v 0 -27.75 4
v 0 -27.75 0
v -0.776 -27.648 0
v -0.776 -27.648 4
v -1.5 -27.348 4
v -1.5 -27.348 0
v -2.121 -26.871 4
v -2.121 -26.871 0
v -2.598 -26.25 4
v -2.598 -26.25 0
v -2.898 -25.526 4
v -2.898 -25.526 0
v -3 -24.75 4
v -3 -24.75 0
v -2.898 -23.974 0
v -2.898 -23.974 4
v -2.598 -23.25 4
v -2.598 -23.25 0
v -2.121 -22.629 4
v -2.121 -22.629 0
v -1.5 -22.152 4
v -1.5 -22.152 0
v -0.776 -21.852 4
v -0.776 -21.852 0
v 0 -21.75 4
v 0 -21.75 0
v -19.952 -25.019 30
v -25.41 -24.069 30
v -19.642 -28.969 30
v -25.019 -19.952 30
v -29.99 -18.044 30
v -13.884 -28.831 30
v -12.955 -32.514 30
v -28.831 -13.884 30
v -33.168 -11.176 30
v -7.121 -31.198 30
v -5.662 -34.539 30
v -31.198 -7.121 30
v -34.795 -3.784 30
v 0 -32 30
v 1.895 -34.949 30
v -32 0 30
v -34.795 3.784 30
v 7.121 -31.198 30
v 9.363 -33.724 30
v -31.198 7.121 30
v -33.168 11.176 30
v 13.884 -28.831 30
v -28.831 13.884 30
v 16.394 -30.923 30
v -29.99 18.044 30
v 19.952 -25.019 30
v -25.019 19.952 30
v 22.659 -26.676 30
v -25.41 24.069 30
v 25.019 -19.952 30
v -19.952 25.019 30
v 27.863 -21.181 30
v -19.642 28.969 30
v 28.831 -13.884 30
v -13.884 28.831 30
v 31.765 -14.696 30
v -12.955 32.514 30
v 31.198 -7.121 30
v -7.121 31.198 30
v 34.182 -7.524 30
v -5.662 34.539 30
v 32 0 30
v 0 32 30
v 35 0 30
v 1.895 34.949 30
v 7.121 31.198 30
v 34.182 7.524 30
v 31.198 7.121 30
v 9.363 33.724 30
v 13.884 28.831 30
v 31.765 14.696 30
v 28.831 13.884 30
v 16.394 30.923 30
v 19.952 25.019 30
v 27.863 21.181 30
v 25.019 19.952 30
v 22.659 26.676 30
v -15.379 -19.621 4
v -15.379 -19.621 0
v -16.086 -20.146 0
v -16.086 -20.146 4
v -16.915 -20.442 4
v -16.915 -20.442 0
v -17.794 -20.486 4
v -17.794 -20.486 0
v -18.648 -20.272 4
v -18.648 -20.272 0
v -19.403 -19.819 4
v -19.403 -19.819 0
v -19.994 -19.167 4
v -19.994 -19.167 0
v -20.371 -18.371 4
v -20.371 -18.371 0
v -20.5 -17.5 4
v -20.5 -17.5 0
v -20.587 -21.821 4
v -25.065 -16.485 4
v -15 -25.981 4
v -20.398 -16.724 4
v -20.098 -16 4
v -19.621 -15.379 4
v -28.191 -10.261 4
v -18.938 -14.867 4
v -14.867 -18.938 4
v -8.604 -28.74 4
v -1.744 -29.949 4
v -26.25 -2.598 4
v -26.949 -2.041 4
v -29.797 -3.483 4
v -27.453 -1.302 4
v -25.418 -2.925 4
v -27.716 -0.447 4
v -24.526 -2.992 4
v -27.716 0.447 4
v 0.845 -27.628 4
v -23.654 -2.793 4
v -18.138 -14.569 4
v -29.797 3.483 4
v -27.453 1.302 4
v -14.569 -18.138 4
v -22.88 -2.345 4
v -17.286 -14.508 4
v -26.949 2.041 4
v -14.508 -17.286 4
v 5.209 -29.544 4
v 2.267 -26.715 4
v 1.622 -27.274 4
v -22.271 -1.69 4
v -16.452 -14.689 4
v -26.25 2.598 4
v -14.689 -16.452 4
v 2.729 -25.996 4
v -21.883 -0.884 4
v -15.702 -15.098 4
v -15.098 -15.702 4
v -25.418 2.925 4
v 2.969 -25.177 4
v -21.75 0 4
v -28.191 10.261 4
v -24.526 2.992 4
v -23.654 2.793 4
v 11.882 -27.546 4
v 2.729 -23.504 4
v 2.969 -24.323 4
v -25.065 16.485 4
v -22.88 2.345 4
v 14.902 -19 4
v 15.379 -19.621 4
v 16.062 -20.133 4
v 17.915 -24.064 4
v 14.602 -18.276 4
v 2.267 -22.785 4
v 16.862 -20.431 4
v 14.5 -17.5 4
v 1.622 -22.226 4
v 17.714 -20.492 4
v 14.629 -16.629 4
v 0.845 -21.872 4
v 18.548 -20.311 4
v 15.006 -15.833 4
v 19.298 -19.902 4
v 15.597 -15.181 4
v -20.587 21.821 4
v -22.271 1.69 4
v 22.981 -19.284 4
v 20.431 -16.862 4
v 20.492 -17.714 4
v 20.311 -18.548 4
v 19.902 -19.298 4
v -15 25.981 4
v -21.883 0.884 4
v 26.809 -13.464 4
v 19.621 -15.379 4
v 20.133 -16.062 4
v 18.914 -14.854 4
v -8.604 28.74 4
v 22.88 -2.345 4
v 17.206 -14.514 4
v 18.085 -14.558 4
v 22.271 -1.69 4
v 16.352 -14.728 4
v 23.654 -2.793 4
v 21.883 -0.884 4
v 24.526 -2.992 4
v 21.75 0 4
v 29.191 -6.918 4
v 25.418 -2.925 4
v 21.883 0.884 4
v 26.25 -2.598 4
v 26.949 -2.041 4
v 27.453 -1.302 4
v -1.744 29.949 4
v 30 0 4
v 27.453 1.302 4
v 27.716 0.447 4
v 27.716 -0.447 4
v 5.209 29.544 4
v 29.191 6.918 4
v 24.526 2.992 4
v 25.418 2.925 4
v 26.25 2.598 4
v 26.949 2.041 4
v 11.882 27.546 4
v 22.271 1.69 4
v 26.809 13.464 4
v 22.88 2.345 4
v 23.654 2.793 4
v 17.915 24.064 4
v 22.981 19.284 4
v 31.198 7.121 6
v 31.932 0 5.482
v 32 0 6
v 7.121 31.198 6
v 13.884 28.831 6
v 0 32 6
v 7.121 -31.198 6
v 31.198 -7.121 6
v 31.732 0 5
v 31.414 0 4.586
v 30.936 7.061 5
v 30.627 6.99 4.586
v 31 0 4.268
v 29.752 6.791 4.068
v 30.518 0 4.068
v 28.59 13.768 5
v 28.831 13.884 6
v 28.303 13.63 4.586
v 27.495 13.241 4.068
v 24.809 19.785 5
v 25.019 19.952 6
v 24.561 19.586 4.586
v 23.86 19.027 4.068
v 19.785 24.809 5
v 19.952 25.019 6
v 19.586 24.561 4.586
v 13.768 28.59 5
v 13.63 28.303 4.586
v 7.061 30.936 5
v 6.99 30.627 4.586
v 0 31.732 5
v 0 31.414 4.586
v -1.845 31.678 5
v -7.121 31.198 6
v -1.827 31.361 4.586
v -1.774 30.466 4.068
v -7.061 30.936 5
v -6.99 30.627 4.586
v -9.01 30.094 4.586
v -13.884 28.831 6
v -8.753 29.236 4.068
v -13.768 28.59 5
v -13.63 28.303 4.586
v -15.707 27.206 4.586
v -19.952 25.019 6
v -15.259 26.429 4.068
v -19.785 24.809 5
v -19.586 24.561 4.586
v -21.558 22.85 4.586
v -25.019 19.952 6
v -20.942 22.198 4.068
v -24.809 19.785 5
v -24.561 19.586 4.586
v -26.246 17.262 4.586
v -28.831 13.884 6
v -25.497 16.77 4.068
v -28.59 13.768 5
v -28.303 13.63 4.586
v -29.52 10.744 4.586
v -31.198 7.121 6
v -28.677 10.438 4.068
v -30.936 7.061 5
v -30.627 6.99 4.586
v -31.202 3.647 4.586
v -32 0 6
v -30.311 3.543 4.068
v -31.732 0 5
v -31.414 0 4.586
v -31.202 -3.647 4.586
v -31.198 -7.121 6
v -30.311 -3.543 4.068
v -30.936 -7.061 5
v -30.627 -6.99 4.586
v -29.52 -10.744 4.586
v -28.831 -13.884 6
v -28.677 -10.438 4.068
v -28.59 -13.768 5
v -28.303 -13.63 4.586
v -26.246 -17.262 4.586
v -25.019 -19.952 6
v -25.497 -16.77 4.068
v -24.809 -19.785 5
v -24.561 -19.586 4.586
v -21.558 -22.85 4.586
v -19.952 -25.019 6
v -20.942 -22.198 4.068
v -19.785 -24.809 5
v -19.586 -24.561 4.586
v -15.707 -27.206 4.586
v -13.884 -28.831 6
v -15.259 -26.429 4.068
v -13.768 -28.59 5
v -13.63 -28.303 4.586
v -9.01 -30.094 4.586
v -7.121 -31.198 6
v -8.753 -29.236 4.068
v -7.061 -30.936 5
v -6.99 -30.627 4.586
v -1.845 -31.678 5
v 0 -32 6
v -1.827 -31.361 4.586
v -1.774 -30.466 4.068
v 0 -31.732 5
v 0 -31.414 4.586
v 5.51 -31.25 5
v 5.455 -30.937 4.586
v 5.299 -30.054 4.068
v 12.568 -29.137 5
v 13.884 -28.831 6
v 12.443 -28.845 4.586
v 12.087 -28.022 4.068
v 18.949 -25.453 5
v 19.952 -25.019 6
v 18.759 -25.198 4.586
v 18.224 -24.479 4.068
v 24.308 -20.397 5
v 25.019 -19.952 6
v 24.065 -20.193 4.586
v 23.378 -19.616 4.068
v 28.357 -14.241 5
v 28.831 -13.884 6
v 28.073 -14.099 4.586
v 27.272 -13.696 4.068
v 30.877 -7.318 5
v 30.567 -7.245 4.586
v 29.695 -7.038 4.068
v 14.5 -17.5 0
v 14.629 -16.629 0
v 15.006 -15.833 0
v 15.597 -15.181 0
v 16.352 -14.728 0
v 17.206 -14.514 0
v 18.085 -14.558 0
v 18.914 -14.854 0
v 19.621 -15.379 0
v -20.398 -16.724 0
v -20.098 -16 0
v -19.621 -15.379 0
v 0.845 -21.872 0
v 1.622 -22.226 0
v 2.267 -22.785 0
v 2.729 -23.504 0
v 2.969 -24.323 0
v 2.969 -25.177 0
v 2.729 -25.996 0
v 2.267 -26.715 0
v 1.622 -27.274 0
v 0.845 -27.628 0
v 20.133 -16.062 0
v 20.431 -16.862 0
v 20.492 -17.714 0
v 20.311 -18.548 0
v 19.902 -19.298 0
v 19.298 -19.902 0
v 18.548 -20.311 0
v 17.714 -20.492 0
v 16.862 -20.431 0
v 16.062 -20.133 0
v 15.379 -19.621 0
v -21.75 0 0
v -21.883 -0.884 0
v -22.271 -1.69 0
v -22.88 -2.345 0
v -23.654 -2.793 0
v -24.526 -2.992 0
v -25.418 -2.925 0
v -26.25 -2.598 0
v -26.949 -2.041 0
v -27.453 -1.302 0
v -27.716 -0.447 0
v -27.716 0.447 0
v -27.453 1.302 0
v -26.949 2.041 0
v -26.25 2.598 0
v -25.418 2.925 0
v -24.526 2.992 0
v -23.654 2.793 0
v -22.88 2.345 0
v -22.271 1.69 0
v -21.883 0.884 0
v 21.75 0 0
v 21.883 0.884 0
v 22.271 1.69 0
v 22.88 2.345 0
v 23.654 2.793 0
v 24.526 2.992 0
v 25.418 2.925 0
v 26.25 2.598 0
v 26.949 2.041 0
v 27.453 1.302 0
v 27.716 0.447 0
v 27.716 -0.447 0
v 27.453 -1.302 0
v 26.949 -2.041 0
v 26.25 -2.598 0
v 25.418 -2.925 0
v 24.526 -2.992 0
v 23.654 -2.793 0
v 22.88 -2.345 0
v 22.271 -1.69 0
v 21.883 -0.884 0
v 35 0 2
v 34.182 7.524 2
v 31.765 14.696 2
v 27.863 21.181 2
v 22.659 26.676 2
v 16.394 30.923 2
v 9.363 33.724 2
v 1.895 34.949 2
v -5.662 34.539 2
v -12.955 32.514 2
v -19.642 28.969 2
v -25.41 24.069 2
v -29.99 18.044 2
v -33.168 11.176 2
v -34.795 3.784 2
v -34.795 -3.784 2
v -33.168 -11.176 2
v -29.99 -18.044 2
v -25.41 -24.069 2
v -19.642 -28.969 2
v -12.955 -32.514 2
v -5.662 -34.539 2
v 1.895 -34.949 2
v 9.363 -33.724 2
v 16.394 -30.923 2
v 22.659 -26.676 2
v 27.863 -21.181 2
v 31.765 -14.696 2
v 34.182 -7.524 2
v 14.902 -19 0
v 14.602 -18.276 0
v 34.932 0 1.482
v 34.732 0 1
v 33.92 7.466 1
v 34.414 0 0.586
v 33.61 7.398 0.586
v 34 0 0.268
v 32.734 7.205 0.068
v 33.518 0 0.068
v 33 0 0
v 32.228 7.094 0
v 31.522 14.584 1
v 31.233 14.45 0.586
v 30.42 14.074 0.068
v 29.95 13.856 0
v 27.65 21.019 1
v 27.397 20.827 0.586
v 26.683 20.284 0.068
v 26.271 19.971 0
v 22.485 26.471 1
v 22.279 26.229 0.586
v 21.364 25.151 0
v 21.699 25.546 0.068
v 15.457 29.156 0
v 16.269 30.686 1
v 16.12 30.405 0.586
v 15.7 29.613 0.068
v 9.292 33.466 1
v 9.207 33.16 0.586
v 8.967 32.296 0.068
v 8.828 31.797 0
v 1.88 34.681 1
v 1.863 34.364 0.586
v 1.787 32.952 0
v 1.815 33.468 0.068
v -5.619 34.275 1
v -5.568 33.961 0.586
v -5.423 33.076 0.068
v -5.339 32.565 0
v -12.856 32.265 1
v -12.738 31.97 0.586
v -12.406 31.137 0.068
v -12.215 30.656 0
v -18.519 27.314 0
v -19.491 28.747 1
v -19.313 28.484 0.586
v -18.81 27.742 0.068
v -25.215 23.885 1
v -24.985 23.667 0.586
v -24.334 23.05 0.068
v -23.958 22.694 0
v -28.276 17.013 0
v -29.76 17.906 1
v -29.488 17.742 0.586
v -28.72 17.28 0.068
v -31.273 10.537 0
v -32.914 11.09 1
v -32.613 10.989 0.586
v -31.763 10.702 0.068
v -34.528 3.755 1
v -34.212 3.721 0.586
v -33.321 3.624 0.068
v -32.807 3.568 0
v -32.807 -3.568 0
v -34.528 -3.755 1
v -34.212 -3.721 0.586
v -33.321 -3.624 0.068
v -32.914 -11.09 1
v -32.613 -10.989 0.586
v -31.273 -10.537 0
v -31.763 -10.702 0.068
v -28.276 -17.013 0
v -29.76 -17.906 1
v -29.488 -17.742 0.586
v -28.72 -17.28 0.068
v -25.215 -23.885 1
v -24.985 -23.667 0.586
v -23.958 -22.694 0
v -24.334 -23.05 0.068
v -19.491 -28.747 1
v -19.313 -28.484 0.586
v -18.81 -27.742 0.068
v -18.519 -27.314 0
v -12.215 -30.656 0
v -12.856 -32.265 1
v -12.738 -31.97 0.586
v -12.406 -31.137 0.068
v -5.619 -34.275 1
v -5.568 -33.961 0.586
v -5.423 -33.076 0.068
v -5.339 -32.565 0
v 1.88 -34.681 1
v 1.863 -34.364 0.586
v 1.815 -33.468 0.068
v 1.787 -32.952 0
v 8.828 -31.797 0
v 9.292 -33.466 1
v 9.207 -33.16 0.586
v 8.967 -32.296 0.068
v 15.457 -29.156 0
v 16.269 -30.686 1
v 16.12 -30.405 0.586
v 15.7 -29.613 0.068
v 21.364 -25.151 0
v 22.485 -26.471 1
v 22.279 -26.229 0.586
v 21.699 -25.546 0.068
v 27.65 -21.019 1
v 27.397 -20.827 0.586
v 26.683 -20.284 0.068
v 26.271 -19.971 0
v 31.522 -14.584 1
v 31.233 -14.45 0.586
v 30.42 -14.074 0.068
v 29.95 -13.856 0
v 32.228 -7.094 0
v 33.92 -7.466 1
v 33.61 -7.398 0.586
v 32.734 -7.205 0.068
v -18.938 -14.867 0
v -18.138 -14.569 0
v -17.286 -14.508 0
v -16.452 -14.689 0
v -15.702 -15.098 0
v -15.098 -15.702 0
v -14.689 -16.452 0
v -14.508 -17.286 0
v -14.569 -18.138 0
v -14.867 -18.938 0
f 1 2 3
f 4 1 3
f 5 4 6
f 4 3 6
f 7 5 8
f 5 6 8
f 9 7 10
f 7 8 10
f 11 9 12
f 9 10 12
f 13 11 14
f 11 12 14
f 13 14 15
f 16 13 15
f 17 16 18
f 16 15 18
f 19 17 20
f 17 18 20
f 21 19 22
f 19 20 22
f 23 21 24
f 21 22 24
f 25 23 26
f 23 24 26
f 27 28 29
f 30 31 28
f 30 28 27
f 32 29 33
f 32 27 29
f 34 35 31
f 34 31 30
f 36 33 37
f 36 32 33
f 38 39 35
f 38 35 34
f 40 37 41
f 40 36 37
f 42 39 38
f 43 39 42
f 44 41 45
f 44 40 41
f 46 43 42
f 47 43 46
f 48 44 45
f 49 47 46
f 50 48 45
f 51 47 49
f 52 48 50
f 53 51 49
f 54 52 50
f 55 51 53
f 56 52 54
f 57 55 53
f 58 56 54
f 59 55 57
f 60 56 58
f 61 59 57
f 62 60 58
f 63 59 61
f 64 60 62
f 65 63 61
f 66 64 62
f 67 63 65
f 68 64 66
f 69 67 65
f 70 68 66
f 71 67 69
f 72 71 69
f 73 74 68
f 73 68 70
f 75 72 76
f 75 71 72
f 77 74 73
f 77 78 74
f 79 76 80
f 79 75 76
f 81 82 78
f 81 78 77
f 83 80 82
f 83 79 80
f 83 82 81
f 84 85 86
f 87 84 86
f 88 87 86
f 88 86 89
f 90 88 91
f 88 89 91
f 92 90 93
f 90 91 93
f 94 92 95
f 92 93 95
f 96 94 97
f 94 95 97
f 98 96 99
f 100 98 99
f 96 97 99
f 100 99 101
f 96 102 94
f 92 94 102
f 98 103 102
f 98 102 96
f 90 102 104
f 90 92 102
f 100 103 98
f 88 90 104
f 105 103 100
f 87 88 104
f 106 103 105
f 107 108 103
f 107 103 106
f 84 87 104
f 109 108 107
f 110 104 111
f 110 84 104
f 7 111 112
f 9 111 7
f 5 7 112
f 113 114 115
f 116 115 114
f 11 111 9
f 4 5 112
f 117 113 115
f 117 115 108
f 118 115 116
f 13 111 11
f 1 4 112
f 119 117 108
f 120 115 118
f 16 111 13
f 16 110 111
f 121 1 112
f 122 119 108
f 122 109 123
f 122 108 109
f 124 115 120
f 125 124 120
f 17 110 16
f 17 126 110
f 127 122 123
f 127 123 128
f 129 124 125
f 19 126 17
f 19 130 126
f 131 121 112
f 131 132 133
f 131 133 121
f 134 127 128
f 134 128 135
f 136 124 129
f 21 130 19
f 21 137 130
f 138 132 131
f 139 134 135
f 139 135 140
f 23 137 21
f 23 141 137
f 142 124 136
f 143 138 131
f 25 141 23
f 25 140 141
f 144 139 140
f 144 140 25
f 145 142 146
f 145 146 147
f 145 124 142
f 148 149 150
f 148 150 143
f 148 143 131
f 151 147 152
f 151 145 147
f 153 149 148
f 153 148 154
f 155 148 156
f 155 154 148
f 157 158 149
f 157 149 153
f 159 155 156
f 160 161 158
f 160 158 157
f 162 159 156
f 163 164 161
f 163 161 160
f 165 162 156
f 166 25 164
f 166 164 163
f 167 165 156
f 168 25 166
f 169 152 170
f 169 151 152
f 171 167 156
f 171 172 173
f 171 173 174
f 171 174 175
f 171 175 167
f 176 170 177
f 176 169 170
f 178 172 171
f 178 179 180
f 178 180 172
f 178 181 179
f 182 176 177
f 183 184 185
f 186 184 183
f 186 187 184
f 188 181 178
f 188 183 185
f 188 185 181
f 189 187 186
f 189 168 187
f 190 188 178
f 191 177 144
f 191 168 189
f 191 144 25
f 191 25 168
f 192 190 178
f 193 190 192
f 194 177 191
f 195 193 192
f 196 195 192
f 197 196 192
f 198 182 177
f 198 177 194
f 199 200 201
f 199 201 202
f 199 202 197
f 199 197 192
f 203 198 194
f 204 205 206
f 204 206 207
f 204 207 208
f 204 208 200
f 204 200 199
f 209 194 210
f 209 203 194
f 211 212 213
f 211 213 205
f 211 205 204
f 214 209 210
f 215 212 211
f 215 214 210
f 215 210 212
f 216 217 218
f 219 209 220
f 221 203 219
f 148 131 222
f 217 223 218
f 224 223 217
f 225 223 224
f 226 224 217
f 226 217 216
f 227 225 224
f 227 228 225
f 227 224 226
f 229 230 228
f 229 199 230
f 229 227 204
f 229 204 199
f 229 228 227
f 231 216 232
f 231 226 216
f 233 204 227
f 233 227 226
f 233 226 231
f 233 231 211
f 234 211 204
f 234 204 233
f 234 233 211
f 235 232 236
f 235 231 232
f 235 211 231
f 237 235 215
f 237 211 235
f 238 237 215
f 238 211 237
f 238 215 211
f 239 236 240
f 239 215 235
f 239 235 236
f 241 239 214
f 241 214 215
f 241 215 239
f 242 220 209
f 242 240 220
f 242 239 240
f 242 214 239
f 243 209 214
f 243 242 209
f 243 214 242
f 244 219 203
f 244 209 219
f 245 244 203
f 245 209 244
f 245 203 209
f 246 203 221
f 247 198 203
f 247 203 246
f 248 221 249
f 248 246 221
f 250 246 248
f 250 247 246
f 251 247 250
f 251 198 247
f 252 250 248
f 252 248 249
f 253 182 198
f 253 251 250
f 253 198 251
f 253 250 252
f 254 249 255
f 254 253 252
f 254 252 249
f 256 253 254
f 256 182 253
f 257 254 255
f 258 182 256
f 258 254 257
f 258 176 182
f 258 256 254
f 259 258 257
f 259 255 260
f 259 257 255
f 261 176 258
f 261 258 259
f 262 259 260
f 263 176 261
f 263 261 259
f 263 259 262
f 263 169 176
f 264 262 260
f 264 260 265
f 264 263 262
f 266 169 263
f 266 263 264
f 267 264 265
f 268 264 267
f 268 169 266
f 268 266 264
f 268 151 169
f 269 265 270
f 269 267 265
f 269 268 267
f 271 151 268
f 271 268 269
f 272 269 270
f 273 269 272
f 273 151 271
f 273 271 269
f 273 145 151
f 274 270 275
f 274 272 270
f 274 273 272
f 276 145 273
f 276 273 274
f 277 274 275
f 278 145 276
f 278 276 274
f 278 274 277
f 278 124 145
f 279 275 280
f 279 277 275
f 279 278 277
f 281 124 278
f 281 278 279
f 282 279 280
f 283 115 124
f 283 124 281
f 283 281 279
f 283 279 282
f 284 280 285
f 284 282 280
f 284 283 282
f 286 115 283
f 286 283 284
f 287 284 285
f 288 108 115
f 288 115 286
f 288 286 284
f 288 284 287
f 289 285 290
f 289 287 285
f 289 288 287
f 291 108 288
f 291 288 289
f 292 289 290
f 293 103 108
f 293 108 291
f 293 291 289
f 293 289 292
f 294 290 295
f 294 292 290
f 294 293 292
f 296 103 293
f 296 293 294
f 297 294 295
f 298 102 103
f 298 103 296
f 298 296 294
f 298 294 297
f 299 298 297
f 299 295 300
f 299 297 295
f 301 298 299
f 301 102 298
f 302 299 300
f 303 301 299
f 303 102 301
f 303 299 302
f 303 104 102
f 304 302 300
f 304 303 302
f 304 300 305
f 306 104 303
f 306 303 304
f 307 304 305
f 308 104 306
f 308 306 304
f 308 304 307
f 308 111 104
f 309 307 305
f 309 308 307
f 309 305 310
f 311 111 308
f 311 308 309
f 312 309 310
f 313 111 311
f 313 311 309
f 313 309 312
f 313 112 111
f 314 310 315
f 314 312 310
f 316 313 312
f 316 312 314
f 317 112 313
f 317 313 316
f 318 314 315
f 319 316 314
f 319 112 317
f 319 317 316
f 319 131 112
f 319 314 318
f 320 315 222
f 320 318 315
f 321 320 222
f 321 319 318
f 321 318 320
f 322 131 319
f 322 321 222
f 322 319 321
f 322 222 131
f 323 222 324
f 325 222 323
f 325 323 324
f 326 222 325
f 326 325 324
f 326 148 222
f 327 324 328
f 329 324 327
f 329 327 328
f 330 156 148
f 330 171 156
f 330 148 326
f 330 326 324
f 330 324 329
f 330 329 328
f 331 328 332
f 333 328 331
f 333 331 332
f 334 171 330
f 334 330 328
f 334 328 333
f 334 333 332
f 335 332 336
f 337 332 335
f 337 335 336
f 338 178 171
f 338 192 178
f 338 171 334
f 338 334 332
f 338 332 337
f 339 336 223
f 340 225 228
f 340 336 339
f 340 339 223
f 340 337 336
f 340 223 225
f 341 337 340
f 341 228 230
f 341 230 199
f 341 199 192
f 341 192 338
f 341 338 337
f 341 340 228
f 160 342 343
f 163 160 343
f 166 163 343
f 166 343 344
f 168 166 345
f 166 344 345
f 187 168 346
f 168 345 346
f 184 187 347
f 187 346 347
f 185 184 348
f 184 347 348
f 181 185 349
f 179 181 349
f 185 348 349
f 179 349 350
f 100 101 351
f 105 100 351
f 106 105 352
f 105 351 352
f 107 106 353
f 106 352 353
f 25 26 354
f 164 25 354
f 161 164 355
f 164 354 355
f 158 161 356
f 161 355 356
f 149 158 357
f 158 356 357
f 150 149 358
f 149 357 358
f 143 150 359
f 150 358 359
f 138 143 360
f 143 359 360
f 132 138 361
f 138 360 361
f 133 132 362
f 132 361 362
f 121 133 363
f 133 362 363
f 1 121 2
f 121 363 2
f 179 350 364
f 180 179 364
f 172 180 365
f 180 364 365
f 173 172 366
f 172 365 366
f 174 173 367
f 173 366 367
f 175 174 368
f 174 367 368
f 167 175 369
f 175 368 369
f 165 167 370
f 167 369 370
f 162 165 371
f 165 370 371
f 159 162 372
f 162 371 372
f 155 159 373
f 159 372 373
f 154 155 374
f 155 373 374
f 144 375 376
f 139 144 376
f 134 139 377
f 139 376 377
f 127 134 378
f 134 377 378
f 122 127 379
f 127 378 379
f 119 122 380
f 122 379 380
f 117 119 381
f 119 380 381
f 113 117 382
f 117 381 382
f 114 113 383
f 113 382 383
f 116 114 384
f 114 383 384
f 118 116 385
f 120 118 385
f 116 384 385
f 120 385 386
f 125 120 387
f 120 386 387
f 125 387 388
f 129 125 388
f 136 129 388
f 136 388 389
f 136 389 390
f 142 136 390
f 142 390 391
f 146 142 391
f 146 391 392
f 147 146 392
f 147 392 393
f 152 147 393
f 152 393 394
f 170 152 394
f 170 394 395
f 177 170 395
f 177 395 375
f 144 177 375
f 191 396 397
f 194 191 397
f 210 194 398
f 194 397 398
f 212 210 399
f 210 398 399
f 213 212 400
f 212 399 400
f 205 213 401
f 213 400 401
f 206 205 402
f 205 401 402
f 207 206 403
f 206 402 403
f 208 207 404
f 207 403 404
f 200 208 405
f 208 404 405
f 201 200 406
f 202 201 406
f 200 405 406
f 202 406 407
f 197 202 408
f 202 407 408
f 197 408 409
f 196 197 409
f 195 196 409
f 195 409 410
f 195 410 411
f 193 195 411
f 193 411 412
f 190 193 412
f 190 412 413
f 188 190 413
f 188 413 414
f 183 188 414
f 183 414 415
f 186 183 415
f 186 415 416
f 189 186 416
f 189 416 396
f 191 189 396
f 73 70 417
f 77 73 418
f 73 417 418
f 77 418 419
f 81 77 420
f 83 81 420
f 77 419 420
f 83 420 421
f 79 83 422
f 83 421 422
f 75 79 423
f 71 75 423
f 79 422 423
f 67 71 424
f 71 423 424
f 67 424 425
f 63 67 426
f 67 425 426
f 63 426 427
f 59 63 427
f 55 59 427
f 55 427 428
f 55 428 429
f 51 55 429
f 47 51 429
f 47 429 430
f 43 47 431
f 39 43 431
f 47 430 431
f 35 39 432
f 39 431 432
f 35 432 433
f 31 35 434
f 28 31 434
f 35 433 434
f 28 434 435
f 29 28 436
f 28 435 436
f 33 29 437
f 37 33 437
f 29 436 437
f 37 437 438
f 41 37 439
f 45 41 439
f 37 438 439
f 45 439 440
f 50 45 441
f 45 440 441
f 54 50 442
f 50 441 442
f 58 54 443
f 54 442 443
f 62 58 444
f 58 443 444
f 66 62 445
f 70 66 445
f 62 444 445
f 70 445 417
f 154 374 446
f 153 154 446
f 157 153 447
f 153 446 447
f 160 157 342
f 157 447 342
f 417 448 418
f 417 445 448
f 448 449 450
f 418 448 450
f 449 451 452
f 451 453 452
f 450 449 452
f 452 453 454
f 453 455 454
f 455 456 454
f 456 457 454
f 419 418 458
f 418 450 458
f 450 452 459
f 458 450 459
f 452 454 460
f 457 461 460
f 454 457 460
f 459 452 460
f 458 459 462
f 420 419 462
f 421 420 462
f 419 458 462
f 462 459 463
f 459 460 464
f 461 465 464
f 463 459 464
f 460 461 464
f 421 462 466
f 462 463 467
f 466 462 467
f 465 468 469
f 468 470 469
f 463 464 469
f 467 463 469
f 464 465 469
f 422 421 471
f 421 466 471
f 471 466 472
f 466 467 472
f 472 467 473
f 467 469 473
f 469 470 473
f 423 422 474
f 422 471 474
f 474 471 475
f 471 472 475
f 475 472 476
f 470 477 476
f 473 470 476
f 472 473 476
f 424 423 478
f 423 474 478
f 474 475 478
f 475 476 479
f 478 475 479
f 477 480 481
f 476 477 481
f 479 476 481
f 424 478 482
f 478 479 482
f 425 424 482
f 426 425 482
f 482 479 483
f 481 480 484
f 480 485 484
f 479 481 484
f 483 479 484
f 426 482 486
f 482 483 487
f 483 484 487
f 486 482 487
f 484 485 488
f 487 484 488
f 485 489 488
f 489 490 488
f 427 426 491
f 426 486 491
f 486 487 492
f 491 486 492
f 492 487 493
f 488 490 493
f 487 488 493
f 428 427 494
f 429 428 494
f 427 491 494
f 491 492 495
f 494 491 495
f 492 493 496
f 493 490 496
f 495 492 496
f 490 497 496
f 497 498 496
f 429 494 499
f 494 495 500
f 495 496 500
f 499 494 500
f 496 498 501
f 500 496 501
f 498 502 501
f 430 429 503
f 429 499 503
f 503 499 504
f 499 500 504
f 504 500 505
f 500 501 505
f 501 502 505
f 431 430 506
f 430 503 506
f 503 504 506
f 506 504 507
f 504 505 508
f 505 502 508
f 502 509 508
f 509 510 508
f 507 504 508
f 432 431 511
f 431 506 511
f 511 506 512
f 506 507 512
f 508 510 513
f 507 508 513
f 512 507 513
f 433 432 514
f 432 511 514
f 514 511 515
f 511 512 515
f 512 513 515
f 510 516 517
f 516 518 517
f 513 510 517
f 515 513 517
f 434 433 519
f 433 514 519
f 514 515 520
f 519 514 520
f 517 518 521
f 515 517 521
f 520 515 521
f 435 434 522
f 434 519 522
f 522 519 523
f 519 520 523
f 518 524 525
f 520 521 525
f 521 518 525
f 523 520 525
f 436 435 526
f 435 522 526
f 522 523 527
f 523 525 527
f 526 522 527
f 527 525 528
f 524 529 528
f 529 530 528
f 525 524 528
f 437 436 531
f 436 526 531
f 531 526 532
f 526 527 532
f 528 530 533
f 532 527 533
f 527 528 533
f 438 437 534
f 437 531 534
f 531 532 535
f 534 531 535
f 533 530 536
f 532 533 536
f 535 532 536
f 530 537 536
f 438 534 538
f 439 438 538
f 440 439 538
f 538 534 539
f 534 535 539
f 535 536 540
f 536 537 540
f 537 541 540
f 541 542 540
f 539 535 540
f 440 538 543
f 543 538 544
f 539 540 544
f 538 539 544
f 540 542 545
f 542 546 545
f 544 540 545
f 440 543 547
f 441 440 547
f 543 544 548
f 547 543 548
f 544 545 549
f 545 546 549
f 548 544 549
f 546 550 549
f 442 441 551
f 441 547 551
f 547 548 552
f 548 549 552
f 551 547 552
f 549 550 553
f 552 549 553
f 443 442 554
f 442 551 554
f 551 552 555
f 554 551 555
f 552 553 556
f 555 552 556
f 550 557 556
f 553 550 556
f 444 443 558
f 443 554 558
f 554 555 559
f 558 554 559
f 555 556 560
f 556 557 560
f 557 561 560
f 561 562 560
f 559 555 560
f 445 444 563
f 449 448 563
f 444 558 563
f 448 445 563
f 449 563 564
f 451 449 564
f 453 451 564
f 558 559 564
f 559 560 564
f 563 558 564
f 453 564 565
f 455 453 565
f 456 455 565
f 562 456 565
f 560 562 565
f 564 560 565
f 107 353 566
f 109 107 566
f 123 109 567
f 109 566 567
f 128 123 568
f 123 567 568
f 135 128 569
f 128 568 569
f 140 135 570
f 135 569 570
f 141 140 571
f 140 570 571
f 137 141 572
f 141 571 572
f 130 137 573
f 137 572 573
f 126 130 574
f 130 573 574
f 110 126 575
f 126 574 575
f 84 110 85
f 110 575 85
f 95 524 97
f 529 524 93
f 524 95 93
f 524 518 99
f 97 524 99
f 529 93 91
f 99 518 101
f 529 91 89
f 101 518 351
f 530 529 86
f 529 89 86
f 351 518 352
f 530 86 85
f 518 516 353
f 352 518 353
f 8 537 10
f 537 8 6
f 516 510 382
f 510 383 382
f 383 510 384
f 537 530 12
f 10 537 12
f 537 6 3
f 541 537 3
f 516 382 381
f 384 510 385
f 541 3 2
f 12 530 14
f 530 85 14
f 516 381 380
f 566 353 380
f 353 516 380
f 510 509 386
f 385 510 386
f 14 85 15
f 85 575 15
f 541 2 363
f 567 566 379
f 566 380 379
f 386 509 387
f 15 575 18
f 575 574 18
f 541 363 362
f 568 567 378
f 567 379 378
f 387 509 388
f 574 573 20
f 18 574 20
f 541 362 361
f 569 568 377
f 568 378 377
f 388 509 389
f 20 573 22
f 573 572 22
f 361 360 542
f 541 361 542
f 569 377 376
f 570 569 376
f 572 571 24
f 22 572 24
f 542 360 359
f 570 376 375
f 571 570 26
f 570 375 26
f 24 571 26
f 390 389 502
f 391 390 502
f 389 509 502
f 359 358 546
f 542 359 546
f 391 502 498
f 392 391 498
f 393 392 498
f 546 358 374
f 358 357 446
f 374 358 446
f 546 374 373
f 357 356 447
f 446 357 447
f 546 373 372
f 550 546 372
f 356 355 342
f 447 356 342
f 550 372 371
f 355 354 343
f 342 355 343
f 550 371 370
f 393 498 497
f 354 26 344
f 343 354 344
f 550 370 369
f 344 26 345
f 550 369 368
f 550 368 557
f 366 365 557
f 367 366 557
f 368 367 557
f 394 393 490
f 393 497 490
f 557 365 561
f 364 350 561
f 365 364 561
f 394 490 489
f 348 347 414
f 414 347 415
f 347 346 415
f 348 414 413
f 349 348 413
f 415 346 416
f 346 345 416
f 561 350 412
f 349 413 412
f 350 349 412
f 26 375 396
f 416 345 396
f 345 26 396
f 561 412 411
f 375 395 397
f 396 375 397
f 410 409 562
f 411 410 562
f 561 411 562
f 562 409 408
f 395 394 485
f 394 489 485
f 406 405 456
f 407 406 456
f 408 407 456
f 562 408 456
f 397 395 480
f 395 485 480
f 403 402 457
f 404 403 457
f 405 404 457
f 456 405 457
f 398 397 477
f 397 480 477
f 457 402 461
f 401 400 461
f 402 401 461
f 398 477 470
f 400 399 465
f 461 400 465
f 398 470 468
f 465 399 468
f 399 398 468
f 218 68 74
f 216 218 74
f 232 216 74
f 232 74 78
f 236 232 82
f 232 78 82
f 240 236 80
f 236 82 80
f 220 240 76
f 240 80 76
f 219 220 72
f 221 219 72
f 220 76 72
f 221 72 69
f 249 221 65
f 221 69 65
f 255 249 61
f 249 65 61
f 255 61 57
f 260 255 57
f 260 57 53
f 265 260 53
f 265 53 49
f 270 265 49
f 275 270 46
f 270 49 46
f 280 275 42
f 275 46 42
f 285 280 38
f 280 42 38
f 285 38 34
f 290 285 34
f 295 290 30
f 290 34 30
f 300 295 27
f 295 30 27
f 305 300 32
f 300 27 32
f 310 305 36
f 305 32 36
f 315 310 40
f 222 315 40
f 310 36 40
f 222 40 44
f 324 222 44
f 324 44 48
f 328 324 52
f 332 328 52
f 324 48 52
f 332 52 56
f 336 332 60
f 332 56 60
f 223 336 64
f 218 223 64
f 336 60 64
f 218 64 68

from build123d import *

# Parameters (mm, degrees)
SKETCH1_R           = 35
BOSS_EXTRUDE1_DEPTH = 30
CUT_EXTRUDE1_DEPTH  = 60
CUT_EXTRUDE2_DEPTH  = 60
SKETCH5_R           = 32
CUT_EXTRUDE3_DEPTH  = 26
FILLET3_R           = 2
FILLET4_R           = 2


with BuildPart() as part:
    # Sketch1 → Boss-Extrude1 (new body)
    with BuildSketch(Plane.XY):
        Circle(SKETCH1_R)
    extrude(amount=BOSS_EXTRUDE1_DEPTH)

    # Sketch3 → Cut-Extrude1 (cut)
    with BuildSketch(Plane(origin=(0, 0, 0), x_dir=(-1, 0, 0), z_dir=(0, 0, -1))):
        with BuildLine():
            ThreePointArc((27.75, 0), (24.75, 3), (21.75, 0))
            Line((21.75, 0), (27.75, 0))
        make_face()
        with BuildLine():
            Line((27.75, 0), (21.75, 0))
            ThreePointArc((21.75, 0), (24.75, -3), (27.75, 0))
        make_face()
        with BuildLine():
            ThreePointArc((19.621320344, -15.378679656), (15.378679656, -15.378679656), (15.378679656, -19.621320344))
            Line((15.378679656, -19.621320344), (19.621320344, -15.378679656))
        make_face()
        with BuildLine():
            Line((19.621320344, -15.378679656), (15.378679656, -19.621320344))
            ThreePointArc((15.378679656, -19.621320344), (18.648050297, -20.271638598), (20.5, -17.5))
            ThreePointArc((20.5, -17.5), (20.271638598, -16.351949703), (19.621320344, -15.378679656))
        make_face()
        with BuildLine():
            ThreePointArc((-14.5, -17.5), (-16.351949703, -14.728361402), (-19.621320344, -15.378679656))
            Line((-19.621320344, -15.378679656), (-15.378679656, -19.621320344))
            ThreePointArc((-15.378679656, -19.621320344), (-14.728361402, -18.648050297), (-14.5, -17.5))
        make_face()
        with BuildLine():
            Line((-15.378679656, -19.621320344), (-19.621320344, -15.378679656))
            ThreePointArc((-19.621320344, -15.378679656), (-19.621320344, -19.621320344), (-15.378679656, -19.621320344))
        make_face()
    extrude(amount=-CUT_EXTRUDE1_DEPTH, mode=Mode.SUBTRACT)

    # Sketch3<3> → Cut-Extrude2 (cut)
    with BuildSketch(Plane(origin=(0, 0, 0), x_dir=(-1, 0, 0), z_dir=(0, 0, -1))):
        with BuildLine():
            ThreePointArc((3, -24.75), (2.121320344, -22.628679656), (0, -21.75))
            Line((0, -21.75), (0, -27.75))
            ThreePointArc((0, -27.75), (2.121320344, -26.871320344), (3, -24.75))
        make_face()
        with BuildLine():
            Line((0, -27.75), (0, -21.75))
            ThreePointArc((0, -21.75), (-3, -24.75), (0, -27.75))
        make_face()
        with BuildLine():
            ThreePointArc((-27.75, 0), (-24.75, -3), (-21.75, 0))
            Line((-21.75, 0), (-27.75, 0))
        make_face()
        with BuildLine():
            Line((-27.75, 0), (-21.75, 0))
            ThreePointArc((-21.75, 0), (-24.75, 3), (-27.75, 0))
        make_face()
    extrude(amount=-CUT_EXTRUDE2_DEPTH, mode=Mode.SUBTRACT)

    # Sketch5 → Cut-Extrude3 (cut)
    with BuildSketch(Plane.XY.offset(30)):
        Circle(SKETCH5_R)
    extrude(amount=-CUT_EXTRUDE3_DEPTH, mode=Mode.SUBTRACT)

    # Fillet3
    fillet3_edges = [part.edges().sort_by_distance(p)[0] for p in [
        (-35, 0, 0),
    ]]
    fillet(fillet3_edges, radius=FILLET3_R)

    # Fillet4
    fillet4_edges = [part.edges().sort_by_distance(p)[0] for p in [
        (-32, 0, 4),
    ]]
    fillet(fillet4_edges, radius=FILLET4_R)


solid = part.part
